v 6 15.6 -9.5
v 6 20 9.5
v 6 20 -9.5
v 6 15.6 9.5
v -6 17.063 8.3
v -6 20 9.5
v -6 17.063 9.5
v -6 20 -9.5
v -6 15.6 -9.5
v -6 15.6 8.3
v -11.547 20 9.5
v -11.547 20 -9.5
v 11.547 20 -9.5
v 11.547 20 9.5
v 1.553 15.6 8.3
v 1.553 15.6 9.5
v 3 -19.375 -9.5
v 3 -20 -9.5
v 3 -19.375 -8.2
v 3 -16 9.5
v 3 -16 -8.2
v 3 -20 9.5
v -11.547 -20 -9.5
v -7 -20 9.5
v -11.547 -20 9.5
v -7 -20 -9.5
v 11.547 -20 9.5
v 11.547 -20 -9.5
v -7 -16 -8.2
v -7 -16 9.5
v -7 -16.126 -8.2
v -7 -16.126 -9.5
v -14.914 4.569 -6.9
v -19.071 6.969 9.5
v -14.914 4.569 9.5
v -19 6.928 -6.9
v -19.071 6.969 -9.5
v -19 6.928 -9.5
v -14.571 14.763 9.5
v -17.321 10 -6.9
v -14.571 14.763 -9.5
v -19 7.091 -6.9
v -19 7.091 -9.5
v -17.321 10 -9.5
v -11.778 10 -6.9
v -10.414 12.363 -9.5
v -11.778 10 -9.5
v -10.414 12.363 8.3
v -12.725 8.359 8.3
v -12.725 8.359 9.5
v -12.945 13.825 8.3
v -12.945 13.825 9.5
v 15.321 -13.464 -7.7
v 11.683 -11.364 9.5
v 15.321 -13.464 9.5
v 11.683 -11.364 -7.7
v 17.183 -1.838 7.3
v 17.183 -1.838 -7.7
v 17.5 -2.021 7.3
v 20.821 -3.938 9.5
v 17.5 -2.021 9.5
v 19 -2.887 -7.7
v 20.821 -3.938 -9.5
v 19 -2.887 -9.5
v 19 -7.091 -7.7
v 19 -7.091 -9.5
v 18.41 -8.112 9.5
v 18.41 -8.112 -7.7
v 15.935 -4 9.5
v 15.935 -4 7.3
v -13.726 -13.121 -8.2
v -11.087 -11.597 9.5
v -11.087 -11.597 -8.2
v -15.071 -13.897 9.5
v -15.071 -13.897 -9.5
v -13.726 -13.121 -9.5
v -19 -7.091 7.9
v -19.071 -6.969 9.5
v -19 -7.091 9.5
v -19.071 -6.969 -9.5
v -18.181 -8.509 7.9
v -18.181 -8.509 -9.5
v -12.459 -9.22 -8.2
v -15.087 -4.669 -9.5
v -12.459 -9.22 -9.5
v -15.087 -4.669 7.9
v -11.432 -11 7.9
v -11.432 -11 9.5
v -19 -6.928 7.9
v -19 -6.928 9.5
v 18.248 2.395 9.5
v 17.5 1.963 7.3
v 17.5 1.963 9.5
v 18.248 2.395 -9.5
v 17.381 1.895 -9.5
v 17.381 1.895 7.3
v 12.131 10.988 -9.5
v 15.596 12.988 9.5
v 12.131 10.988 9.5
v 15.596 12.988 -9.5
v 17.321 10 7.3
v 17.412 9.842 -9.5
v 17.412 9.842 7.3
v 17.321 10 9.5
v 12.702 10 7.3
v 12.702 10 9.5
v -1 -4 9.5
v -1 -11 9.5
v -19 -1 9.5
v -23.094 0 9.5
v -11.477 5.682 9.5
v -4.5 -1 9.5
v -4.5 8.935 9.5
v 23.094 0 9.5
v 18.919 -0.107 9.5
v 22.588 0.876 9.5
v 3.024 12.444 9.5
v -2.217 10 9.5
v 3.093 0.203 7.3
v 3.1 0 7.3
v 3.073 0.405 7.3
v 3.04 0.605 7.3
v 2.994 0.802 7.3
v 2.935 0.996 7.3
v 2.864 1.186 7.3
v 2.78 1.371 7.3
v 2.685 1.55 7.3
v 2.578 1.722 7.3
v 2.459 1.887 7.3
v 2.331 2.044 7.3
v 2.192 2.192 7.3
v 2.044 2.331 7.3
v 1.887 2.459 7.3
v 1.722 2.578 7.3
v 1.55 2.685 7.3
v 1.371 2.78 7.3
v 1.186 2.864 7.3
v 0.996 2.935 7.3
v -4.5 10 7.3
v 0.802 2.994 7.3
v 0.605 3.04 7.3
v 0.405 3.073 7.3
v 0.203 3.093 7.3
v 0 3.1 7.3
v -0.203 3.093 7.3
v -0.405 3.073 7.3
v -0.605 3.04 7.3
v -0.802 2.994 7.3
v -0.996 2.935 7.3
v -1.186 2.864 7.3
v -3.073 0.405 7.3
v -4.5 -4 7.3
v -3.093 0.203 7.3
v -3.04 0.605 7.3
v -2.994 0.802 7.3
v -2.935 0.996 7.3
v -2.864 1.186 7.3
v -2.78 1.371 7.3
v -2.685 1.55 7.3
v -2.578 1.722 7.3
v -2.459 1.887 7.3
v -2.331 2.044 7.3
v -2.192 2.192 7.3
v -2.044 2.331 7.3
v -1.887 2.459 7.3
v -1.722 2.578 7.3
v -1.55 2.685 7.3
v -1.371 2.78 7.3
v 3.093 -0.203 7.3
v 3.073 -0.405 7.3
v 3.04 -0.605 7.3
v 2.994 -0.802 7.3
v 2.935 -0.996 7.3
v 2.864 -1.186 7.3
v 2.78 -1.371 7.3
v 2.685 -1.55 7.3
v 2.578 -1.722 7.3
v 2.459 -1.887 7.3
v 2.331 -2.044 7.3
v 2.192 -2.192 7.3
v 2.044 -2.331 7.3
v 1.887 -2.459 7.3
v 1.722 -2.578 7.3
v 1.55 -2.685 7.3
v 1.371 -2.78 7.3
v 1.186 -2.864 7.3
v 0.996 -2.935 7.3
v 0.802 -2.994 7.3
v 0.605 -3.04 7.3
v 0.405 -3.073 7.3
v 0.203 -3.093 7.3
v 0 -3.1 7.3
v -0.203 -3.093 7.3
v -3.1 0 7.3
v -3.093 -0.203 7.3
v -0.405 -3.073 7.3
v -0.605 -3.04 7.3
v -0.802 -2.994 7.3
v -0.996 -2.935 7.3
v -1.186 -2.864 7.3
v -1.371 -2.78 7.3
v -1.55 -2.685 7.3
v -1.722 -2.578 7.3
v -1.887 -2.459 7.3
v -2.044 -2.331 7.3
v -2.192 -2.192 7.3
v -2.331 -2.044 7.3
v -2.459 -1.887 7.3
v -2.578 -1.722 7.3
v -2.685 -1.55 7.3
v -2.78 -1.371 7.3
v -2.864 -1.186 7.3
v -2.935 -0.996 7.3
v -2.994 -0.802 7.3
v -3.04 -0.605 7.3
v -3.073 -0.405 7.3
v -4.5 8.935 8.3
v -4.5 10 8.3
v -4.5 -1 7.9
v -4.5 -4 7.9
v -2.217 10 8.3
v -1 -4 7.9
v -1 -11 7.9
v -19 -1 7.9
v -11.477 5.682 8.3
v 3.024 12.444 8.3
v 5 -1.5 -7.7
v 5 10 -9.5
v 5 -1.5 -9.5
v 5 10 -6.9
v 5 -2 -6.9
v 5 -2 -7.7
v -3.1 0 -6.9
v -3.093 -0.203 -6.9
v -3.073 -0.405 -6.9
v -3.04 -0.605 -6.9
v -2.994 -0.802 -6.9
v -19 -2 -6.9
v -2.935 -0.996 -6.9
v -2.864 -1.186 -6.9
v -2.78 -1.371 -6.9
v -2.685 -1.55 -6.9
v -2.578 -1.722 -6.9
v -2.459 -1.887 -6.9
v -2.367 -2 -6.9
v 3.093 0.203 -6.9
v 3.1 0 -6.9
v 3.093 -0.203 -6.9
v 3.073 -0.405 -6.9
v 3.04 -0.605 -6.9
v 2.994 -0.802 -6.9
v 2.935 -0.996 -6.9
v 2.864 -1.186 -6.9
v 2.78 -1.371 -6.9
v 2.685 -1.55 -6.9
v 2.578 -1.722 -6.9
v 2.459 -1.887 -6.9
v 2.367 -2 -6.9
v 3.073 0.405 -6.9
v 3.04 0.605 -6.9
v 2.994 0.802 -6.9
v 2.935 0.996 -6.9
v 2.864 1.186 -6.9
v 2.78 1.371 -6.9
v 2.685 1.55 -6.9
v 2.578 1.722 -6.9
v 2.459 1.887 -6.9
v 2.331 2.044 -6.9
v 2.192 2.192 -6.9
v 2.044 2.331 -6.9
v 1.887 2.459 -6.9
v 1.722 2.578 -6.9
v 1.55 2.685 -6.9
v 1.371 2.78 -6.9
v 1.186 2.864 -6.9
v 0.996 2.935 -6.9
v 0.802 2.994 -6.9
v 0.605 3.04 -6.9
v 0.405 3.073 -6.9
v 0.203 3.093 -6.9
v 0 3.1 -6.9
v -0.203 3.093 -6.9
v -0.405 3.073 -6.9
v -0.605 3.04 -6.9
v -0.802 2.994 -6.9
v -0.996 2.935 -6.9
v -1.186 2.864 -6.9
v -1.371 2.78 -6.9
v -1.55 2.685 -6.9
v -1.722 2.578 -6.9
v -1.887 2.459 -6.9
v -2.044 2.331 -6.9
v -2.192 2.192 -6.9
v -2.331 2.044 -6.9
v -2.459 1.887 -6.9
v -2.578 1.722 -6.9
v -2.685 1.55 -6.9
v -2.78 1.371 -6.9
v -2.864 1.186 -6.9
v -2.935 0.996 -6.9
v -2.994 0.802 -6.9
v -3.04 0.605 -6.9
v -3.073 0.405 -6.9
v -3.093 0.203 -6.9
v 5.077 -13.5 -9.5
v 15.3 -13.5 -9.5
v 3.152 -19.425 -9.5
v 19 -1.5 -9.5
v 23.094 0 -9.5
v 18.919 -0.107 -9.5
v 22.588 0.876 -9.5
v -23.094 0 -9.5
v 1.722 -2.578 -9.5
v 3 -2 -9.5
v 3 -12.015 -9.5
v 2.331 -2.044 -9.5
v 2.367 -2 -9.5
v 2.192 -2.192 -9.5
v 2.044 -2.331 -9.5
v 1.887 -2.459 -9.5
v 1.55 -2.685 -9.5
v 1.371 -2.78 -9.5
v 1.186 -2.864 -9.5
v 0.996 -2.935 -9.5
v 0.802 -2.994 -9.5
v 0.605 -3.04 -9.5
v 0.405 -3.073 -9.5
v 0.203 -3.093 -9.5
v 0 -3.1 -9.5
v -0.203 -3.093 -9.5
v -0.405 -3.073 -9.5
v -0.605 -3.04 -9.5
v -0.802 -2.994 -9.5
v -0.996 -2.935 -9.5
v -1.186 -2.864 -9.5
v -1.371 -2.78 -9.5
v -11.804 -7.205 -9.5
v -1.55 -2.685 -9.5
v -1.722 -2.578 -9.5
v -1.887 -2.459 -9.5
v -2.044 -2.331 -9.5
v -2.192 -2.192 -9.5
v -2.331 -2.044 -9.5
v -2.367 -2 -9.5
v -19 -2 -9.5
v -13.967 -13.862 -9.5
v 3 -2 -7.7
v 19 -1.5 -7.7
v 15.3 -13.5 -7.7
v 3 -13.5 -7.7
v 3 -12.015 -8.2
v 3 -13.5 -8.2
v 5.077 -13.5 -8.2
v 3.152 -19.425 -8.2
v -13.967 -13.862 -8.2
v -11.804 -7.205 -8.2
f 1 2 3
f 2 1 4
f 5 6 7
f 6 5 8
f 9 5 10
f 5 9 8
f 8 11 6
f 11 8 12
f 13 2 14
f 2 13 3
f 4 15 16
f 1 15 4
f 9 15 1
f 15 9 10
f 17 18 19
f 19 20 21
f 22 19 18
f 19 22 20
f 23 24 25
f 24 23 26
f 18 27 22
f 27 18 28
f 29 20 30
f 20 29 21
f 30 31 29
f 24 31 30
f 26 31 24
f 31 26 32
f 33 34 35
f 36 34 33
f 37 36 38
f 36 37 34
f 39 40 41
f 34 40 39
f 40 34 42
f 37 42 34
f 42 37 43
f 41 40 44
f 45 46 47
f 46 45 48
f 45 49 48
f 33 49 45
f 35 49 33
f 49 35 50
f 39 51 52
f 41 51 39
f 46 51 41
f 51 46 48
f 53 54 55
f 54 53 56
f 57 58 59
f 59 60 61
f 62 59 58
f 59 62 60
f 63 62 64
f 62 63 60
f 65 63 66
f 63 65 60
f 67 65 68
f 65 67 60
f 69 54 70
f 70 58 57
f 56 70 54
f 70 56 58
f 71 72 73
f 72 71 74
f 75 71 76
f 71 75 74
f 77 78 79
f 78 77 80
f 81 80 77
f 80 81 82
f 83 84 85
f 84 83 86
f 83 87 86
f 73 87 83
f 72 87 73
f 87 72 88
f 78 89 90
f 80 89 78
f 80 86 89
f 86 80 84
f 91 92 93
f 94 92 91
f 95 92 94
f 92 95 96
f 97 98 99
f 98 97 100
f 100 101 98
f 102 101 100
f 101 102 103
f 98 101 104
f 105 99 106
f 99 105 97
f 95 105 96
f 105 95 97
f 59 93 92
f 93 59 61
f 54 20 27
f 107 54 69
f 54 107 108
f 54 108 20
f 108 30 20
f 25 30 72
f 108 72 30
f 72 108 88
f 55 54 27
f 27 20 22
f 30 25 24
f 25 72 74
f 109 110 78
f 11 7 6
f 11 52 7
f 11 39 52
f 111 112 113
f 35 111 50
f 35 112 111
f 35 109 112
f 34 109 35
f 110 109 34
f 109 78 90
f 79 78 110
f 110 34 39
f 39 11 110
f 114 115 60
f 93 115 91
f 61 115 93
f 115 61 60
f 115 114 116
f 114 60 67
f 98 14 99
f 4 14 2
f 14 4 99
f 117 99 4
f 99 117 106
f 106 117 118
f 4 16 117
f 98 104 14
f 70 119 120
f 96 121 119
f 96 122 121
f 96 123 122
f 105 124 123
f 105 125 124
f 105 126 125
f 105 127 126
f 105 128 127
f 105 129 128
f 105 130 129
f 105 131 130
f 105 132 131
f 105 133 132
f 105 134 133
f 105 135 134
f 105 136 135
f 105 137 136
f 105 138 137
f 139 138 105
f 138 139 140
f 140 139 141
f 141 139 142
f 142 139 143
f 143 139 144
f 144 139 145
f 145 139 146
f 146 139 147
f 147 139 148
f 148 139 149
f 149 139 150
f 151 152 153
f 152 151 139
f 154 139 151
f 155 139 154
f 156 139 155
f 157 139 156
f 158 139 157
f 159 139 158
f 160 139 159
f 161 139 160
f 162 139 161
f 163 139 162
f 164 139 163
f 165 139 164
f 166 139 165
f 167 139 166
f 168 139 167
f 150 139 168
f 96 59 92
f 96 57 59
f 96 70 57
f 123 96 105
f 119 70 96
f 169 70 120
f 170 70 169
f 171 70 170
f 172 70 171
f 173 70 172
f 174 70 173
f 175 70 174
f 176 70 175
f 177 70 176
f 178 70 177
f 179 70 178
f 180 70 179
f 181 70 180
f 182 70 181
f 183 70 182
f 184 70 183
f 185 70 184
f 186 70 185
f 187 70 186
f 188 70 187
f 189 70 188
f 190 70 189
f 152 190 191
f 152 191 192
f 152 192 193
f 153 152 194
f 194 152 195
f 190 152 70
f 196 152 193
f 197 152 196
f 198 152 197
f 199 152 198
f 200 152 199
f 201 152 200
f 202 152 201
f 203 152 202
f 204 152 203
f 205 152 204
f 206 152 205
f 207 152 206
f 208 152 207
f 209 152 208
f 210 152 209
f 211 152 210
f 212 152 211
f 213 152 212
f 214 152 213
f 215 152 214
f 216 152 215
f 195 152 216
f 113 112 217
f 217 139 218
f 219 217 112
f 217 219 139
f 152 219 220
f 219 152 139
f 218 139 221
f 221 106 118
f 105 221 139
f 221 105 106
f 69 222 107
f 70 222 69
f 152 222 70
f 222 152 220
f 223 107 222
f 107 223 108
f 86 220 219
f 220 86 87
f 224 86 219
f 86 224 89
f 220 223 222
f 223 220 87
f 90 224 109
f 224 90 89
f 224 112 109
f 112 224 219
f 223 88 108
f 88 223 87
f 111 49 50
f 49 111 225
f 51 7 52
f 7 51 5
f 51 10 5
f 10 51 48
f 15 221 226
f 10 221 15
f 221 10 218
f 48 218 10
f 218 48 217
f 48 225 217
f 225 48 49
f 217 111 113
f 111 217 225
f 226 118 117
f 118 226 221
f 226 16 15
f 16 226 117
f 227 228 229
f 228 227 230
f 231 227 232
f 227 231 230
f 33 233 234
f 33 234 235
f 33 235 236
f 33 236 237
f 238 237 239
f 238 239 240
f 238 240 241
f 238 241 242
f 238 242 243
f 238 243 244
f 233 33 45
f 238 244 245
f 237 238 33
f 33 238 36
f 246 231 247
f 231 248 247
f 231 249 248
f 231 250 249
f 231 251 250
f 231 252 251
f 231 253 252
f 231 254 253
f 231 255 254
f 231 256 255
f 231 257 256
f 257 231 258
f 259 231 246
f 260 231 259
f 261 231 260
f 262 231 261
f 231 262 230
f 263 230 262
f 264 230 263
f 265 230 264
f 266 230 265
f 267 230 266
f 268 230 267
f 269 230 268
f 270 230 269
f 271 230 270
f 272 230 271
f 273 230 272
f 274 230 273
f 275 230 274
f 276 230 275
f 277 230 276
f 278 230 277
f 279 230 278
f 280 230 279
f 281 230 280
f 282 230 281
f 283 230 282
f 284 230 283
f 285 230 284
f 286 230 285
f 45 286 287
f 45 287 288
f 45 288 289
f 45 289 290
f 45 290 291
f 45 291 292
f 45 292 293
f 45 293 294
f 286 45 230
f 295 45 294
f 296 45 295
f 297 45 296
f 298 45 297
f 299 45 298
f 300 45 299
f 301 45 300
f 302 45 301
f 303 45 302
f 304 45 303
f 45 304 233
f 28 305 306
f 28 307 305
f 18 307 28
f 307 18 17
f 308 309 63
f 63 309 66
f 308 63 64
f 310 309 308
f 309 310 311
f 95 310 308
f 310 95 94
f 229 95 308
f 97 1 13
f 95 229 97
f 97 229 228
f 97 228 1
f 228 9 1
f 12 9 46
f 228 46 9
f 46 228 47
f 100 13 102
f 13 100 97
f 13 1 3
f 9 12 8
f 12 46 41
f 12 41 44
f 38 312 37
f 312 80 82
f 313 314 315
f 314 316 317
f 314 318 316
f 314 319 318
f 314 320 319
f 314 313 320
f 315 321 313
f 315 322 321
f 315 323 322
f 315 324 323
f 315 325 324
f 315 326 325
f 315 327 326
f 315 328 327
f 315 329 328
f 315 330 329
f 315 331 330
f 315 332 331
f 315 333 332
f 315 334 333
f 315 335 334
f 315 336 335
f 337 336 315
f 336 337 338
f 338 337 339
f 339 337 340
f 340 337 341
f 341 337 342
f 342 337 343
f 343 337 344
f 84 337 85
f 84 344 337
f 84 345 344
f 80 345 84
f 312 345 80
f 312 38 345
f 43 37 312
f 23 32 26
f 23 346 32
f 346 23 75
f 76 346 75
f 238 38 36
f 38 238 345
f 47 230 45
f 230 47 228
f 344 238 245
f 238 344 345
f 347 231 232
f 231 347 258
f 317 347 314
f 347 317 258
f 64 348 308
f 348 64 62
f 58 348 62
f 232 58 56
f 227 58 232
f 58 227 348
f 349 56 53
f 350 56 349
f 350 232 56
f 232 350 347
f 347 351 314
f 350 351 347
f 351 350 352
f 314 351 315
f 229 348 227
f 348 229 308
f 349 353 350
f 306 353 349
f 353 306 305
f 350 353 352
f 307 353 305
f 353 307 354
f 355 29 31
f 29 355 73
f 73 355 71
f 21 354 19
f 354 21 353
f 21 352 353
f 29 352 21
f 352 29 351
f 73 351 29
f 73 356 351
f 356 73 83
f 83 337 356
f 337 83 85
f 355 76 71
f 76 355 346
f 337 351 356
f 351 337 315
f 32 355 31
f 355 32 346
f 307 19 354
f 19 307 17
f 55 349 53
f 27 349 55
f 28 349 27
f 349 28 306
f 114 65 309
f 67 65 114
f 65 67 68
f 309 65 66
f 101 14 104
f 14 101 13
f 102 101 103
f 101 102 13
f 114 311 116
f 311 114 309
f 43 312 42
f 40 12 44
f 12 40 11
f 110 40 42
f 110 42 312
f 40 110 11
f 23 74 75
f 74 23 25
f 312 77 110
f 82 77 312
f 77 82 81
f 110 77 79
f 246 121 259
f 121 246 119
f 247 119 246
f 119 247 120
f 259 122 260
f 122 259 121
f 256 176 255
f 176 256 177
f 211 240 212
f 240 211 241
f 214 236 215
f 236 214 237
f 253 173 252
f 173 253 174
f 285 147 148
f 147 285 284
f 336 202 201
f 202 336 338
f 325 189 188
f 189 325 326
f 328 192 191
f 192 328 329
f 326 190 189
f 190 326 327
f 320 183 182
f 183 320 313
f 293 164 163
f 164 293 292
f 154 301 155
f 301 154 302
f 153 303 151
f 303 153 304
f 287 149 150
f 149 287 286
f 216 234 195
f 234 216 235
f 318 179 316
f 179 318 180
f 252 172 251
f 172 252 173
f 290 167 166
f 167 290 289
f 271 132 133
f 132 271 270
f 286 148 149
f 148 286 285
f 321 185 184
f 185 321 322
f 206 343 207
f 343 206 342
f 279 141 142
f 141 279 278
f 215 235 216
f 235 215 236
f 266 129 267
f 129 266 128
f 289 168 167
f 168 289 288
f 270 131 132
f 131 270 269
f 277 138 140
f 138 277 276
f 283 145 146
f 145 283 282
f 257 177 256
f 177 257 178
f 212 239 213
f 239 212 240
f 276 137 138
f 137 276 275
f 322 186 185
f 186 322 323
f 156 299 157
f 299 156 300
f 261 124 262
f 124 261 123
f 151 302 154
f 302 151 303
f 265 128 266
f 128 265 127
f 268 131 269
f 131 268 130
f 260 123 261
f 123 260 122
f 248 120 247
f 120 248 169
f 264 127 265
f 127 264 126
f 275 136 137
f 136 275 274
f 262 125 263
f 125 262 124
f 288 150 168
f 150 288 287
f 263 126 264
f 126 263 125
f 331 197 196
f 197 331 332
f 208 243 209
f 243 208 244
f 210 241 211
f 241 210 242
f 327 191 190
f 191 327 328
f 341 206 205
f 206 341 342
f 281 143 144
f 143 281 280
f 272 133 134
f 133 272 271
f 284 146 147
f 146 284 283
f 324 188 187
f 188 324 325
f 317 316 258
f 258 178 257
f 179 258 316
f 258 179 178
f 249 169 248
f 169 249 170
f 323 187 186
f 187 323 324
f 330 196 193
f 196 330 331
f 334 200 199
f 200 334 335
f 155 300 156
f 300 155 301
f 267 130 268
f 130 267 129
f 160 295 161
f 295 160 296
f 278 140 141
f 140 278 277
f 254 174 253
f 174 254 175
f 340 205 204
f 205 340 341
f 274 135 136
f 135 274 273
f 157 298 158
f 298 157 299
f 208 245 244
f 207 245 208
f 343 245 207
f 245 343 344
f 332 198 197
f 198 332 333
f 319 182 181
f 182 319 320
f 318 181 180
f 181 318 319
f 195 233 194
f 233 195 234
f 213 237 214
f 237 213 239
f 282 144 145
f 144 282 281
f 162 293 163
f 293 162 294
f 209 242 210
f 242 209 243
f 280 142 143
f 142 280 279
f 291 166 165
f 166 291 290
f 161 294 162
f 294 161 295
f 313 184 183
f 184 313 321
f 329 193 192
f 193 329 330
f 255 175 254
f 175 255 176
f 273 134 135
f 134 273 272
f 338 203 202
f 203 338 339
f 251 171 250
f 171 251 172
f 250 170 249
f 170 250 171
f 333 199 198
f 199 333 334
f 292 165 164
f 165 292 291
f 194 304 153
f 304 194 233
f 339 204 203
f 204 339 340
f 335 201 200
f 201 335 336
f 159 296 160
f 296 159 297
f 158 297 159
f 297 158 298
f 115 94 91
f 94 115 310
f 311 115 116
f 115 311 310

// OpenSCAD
$fn=96;

bbox_x = 46.2;
bbox_y = 40.0;
bbox_z = 19.0;

th = bbox_z;

hole_d = 6.2;

hex_flat = bbox_y;                 // across flats
hex_R = hex_flat / sqrt(3);        // circumradius for pointy-top hex

module hex_prism(h=th, r=hex_R){
    cylinder(h=h, r=r, center=true, $fn=6);
}

module notch_rect(w, d, h, zc=0){
    translate([0,0,zc]) cube([w,d,h], center=true);
}

module perimeter_notches(){
    // Notches are subtracted; placed around perimeter with slight asymmetry
    // Depth is radial (local +Y after rotation)
    notch_h = th + 2;

    // Top/bottom edge notches
    rotate([0,0,0])   translate([0, hex_flat/2 - 2.2, 0]) notch_rect(12.0, 4.4, notch_h);
    rotate([0,0,180]) translate([2.0, hex_flat/2 - 2.0, 0]) notch_rect(10.0, 4.0, notch_h);

    // Upper-right / lower-left
    rotate([0,0,60])  translate([1.0, hex_flat/2 - 2.4, 0]) notch_rect(9.0, 4.8, notch_h);
    rotate([0,0,240]) translate([-1.5, hex_flat/2 - 2.1, 0]) notch_rect(11.0, 4.2, notch_h);

    // Upper-left / lower-right
    rotate([0,0,120]) translate([-0.5, hex_flat/2 - 2.3, 0]) notch_rect(8.0, 4.6, notch_h);
    rotate([0,0,300]) translate([1.8, hex_flat/2 - 2.0, 0]) notch_rect(10.5, 4.0, notch_h);
}

module top_reliefs(){
    // Shallow asymmetric pockets on top face
    zt = th/2 - 2.2/2;
    translate([6.5, 3.0, zt]) cube([22.0, 14.0, 2.2], center=true);
    translate([-10.0, -6.0, th/2 - 1.6/2]) cube([18.0, 10.0, 1.6], center=true);
    rotate([0,0,25]) translate([0.0, 14.0, th/2 - 1.2/2]) cube([16.0, 8.0, 1.2], center=true);
}

module bottom_reliefs(){
    // Shallow asymmetric pockets on bottom face (different from top)
    zb = -th/2 + 2.6/2;
    translate([-7.0, 4.0, zb]) cube([24.0, 12.0, 2.6], center=true);
    translate([11.0, -7.5, -th/2 + 1.8/2]) cube([16.0, 12.0, 1.8], center=true);
    rotate([0,0,-18]) translate([0.0, -14.0, -th/2 + 1.3/2]) cube([18.0, 7.0, 1.3], center=true);
}

difference(){
    union(){
        hex_prism(th, hex_R);
    }

    // Central through-hole
    cylinder(h=th+2, d=hole_d, center=true, $fn=96);

    // Perimeter steps/notches
    perimeter_notches();

    // Asymmetric top/bottom reliefs
    top_reliefs();
    bottom_reliefs();

    // Small side key cut to emphasize asymmetry
    rotate([0,0,15]) translate([hex_R*0.92, 0, 0]) cube([6.0, 10.0, th+2], center=true);
}
